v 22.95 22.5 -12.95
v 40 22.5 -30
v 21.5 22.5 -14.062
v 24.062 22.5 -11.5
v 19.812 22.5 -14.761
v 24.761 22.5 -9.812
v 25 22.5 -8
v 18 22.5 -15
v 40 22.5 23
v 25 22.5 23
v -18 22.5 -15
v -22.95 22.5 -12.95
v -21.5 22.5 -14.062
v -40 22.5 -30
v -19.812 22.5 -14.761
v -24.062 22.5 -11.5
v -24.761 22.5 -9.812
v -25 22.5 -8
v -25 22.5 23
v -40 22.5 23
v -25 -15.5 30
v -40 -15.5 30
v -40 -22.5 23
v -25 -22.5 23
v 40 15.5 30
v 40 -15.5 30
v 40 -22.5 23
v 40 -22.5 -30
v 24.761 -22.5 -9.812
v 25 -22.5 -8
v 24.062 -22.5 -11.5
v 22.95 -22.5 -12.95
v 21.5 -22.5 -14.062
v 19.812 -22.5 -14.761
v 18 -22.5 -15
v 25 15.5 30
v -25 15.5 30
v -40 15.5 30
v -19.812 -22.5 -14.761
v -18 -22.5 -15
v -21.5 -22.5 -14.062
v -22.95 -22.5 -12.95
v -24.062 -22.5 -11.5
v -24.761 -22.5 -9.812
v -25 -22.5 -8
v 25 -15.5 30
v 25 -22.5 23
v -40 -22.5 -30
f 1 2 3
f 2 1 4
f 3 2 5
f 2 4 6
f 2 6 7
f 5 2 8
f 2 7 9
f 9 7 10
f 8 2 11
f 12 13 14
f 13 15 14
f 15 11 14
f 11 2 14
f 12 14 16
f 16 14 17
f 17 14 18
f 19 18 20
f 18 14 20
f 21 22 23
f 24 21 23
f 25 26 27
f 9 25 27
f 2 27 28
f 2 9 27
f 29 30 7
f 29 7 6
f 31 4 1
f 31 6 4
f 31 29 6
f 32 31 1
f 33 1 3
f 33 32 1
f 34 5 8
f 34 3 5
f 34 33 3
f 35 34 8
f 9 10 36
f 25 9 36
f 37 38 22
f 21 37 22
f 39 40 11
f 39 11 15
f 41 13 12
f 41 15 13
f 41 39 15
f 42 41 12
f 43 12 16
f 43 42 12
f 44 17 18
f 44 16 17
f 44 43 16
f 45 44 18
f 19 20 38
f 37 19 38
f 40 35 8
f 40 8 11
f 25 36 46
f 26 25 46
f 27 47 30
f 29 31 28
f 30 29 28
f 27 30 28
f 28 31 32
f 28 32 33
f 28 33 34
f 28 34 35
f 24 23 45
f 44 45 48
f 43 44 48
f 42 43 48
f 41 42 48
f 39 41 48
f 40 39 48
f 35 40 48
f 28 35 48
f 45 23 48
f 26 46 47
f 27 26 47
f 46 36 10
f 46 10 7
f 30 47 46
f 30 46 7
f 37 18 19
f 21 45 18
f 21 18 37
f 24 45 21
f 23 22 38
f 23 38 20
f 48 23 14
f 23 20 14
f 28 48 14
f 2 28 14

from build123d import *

# Parameters (mm, degrees)
BOSS_EXTRUDE1_DEPTH      = 40
BOSS_EXTRUDE1_DEPTH_BACK = 40
CUT_EXTRUDE1_DEPTH       = 68.268120235
CUT_EXTRUDE1_DEPTH_BACK  = 68.268120235


with BuildPart() as part:
    # Sketch3 → Boss-Extrude1 (new, two sides: drawn at the far end of the back side and taken through both)
    with BuildSketch(Plane(origin=(0, 0, 0), x_dir=(0, 0, -1), z_dir=(1, 0, 0)).offset(-BOSS_EXTRUDE1_DEPTH_BACK)):
        Polygon((-30, -15.5), (-23, -22.5), (30, -22.5), (30, 22.5), (-23, 22.5), (-30, 15.5), align=None)
    extrude(amount=BOSS_EXTRUDE1_DEPTH + BOSS_EXTRUDE1_DEPTH_BACK)

    # Sketch4 → Cut-Extrude1 (cut, two sides: drawn at the far end of the back side and taken through both)
    with BuildSketch(Plane(origin=(0, 22.5, 0), x_dir=(1, 0, 0), z_dir=(0, 1, 0)).offset(-CUT_EXTRUDE1_DEPTH_BACK)):
        with BuildLine():
            Line((18, 15), (-18, 15))
            ThreePointArc((-18, 15), (-22.949747468, 12.949747468), (-25, 8))
            Line((-25, 8), (-25, -30))
            Line((-25, -30), (25, -30))
            Line((25, -30), (25, 8))
            ThreePointArc((25, 8), (22.949747468, 12.949747468), (18, 15))
        make_face()
    extrude(amount=CUT_EXTRUDE1_DEPTH + CUT_EXTRUDE1_DEPTH_BACK, mode=Mode.SUBTRACT)


solid = part.part
